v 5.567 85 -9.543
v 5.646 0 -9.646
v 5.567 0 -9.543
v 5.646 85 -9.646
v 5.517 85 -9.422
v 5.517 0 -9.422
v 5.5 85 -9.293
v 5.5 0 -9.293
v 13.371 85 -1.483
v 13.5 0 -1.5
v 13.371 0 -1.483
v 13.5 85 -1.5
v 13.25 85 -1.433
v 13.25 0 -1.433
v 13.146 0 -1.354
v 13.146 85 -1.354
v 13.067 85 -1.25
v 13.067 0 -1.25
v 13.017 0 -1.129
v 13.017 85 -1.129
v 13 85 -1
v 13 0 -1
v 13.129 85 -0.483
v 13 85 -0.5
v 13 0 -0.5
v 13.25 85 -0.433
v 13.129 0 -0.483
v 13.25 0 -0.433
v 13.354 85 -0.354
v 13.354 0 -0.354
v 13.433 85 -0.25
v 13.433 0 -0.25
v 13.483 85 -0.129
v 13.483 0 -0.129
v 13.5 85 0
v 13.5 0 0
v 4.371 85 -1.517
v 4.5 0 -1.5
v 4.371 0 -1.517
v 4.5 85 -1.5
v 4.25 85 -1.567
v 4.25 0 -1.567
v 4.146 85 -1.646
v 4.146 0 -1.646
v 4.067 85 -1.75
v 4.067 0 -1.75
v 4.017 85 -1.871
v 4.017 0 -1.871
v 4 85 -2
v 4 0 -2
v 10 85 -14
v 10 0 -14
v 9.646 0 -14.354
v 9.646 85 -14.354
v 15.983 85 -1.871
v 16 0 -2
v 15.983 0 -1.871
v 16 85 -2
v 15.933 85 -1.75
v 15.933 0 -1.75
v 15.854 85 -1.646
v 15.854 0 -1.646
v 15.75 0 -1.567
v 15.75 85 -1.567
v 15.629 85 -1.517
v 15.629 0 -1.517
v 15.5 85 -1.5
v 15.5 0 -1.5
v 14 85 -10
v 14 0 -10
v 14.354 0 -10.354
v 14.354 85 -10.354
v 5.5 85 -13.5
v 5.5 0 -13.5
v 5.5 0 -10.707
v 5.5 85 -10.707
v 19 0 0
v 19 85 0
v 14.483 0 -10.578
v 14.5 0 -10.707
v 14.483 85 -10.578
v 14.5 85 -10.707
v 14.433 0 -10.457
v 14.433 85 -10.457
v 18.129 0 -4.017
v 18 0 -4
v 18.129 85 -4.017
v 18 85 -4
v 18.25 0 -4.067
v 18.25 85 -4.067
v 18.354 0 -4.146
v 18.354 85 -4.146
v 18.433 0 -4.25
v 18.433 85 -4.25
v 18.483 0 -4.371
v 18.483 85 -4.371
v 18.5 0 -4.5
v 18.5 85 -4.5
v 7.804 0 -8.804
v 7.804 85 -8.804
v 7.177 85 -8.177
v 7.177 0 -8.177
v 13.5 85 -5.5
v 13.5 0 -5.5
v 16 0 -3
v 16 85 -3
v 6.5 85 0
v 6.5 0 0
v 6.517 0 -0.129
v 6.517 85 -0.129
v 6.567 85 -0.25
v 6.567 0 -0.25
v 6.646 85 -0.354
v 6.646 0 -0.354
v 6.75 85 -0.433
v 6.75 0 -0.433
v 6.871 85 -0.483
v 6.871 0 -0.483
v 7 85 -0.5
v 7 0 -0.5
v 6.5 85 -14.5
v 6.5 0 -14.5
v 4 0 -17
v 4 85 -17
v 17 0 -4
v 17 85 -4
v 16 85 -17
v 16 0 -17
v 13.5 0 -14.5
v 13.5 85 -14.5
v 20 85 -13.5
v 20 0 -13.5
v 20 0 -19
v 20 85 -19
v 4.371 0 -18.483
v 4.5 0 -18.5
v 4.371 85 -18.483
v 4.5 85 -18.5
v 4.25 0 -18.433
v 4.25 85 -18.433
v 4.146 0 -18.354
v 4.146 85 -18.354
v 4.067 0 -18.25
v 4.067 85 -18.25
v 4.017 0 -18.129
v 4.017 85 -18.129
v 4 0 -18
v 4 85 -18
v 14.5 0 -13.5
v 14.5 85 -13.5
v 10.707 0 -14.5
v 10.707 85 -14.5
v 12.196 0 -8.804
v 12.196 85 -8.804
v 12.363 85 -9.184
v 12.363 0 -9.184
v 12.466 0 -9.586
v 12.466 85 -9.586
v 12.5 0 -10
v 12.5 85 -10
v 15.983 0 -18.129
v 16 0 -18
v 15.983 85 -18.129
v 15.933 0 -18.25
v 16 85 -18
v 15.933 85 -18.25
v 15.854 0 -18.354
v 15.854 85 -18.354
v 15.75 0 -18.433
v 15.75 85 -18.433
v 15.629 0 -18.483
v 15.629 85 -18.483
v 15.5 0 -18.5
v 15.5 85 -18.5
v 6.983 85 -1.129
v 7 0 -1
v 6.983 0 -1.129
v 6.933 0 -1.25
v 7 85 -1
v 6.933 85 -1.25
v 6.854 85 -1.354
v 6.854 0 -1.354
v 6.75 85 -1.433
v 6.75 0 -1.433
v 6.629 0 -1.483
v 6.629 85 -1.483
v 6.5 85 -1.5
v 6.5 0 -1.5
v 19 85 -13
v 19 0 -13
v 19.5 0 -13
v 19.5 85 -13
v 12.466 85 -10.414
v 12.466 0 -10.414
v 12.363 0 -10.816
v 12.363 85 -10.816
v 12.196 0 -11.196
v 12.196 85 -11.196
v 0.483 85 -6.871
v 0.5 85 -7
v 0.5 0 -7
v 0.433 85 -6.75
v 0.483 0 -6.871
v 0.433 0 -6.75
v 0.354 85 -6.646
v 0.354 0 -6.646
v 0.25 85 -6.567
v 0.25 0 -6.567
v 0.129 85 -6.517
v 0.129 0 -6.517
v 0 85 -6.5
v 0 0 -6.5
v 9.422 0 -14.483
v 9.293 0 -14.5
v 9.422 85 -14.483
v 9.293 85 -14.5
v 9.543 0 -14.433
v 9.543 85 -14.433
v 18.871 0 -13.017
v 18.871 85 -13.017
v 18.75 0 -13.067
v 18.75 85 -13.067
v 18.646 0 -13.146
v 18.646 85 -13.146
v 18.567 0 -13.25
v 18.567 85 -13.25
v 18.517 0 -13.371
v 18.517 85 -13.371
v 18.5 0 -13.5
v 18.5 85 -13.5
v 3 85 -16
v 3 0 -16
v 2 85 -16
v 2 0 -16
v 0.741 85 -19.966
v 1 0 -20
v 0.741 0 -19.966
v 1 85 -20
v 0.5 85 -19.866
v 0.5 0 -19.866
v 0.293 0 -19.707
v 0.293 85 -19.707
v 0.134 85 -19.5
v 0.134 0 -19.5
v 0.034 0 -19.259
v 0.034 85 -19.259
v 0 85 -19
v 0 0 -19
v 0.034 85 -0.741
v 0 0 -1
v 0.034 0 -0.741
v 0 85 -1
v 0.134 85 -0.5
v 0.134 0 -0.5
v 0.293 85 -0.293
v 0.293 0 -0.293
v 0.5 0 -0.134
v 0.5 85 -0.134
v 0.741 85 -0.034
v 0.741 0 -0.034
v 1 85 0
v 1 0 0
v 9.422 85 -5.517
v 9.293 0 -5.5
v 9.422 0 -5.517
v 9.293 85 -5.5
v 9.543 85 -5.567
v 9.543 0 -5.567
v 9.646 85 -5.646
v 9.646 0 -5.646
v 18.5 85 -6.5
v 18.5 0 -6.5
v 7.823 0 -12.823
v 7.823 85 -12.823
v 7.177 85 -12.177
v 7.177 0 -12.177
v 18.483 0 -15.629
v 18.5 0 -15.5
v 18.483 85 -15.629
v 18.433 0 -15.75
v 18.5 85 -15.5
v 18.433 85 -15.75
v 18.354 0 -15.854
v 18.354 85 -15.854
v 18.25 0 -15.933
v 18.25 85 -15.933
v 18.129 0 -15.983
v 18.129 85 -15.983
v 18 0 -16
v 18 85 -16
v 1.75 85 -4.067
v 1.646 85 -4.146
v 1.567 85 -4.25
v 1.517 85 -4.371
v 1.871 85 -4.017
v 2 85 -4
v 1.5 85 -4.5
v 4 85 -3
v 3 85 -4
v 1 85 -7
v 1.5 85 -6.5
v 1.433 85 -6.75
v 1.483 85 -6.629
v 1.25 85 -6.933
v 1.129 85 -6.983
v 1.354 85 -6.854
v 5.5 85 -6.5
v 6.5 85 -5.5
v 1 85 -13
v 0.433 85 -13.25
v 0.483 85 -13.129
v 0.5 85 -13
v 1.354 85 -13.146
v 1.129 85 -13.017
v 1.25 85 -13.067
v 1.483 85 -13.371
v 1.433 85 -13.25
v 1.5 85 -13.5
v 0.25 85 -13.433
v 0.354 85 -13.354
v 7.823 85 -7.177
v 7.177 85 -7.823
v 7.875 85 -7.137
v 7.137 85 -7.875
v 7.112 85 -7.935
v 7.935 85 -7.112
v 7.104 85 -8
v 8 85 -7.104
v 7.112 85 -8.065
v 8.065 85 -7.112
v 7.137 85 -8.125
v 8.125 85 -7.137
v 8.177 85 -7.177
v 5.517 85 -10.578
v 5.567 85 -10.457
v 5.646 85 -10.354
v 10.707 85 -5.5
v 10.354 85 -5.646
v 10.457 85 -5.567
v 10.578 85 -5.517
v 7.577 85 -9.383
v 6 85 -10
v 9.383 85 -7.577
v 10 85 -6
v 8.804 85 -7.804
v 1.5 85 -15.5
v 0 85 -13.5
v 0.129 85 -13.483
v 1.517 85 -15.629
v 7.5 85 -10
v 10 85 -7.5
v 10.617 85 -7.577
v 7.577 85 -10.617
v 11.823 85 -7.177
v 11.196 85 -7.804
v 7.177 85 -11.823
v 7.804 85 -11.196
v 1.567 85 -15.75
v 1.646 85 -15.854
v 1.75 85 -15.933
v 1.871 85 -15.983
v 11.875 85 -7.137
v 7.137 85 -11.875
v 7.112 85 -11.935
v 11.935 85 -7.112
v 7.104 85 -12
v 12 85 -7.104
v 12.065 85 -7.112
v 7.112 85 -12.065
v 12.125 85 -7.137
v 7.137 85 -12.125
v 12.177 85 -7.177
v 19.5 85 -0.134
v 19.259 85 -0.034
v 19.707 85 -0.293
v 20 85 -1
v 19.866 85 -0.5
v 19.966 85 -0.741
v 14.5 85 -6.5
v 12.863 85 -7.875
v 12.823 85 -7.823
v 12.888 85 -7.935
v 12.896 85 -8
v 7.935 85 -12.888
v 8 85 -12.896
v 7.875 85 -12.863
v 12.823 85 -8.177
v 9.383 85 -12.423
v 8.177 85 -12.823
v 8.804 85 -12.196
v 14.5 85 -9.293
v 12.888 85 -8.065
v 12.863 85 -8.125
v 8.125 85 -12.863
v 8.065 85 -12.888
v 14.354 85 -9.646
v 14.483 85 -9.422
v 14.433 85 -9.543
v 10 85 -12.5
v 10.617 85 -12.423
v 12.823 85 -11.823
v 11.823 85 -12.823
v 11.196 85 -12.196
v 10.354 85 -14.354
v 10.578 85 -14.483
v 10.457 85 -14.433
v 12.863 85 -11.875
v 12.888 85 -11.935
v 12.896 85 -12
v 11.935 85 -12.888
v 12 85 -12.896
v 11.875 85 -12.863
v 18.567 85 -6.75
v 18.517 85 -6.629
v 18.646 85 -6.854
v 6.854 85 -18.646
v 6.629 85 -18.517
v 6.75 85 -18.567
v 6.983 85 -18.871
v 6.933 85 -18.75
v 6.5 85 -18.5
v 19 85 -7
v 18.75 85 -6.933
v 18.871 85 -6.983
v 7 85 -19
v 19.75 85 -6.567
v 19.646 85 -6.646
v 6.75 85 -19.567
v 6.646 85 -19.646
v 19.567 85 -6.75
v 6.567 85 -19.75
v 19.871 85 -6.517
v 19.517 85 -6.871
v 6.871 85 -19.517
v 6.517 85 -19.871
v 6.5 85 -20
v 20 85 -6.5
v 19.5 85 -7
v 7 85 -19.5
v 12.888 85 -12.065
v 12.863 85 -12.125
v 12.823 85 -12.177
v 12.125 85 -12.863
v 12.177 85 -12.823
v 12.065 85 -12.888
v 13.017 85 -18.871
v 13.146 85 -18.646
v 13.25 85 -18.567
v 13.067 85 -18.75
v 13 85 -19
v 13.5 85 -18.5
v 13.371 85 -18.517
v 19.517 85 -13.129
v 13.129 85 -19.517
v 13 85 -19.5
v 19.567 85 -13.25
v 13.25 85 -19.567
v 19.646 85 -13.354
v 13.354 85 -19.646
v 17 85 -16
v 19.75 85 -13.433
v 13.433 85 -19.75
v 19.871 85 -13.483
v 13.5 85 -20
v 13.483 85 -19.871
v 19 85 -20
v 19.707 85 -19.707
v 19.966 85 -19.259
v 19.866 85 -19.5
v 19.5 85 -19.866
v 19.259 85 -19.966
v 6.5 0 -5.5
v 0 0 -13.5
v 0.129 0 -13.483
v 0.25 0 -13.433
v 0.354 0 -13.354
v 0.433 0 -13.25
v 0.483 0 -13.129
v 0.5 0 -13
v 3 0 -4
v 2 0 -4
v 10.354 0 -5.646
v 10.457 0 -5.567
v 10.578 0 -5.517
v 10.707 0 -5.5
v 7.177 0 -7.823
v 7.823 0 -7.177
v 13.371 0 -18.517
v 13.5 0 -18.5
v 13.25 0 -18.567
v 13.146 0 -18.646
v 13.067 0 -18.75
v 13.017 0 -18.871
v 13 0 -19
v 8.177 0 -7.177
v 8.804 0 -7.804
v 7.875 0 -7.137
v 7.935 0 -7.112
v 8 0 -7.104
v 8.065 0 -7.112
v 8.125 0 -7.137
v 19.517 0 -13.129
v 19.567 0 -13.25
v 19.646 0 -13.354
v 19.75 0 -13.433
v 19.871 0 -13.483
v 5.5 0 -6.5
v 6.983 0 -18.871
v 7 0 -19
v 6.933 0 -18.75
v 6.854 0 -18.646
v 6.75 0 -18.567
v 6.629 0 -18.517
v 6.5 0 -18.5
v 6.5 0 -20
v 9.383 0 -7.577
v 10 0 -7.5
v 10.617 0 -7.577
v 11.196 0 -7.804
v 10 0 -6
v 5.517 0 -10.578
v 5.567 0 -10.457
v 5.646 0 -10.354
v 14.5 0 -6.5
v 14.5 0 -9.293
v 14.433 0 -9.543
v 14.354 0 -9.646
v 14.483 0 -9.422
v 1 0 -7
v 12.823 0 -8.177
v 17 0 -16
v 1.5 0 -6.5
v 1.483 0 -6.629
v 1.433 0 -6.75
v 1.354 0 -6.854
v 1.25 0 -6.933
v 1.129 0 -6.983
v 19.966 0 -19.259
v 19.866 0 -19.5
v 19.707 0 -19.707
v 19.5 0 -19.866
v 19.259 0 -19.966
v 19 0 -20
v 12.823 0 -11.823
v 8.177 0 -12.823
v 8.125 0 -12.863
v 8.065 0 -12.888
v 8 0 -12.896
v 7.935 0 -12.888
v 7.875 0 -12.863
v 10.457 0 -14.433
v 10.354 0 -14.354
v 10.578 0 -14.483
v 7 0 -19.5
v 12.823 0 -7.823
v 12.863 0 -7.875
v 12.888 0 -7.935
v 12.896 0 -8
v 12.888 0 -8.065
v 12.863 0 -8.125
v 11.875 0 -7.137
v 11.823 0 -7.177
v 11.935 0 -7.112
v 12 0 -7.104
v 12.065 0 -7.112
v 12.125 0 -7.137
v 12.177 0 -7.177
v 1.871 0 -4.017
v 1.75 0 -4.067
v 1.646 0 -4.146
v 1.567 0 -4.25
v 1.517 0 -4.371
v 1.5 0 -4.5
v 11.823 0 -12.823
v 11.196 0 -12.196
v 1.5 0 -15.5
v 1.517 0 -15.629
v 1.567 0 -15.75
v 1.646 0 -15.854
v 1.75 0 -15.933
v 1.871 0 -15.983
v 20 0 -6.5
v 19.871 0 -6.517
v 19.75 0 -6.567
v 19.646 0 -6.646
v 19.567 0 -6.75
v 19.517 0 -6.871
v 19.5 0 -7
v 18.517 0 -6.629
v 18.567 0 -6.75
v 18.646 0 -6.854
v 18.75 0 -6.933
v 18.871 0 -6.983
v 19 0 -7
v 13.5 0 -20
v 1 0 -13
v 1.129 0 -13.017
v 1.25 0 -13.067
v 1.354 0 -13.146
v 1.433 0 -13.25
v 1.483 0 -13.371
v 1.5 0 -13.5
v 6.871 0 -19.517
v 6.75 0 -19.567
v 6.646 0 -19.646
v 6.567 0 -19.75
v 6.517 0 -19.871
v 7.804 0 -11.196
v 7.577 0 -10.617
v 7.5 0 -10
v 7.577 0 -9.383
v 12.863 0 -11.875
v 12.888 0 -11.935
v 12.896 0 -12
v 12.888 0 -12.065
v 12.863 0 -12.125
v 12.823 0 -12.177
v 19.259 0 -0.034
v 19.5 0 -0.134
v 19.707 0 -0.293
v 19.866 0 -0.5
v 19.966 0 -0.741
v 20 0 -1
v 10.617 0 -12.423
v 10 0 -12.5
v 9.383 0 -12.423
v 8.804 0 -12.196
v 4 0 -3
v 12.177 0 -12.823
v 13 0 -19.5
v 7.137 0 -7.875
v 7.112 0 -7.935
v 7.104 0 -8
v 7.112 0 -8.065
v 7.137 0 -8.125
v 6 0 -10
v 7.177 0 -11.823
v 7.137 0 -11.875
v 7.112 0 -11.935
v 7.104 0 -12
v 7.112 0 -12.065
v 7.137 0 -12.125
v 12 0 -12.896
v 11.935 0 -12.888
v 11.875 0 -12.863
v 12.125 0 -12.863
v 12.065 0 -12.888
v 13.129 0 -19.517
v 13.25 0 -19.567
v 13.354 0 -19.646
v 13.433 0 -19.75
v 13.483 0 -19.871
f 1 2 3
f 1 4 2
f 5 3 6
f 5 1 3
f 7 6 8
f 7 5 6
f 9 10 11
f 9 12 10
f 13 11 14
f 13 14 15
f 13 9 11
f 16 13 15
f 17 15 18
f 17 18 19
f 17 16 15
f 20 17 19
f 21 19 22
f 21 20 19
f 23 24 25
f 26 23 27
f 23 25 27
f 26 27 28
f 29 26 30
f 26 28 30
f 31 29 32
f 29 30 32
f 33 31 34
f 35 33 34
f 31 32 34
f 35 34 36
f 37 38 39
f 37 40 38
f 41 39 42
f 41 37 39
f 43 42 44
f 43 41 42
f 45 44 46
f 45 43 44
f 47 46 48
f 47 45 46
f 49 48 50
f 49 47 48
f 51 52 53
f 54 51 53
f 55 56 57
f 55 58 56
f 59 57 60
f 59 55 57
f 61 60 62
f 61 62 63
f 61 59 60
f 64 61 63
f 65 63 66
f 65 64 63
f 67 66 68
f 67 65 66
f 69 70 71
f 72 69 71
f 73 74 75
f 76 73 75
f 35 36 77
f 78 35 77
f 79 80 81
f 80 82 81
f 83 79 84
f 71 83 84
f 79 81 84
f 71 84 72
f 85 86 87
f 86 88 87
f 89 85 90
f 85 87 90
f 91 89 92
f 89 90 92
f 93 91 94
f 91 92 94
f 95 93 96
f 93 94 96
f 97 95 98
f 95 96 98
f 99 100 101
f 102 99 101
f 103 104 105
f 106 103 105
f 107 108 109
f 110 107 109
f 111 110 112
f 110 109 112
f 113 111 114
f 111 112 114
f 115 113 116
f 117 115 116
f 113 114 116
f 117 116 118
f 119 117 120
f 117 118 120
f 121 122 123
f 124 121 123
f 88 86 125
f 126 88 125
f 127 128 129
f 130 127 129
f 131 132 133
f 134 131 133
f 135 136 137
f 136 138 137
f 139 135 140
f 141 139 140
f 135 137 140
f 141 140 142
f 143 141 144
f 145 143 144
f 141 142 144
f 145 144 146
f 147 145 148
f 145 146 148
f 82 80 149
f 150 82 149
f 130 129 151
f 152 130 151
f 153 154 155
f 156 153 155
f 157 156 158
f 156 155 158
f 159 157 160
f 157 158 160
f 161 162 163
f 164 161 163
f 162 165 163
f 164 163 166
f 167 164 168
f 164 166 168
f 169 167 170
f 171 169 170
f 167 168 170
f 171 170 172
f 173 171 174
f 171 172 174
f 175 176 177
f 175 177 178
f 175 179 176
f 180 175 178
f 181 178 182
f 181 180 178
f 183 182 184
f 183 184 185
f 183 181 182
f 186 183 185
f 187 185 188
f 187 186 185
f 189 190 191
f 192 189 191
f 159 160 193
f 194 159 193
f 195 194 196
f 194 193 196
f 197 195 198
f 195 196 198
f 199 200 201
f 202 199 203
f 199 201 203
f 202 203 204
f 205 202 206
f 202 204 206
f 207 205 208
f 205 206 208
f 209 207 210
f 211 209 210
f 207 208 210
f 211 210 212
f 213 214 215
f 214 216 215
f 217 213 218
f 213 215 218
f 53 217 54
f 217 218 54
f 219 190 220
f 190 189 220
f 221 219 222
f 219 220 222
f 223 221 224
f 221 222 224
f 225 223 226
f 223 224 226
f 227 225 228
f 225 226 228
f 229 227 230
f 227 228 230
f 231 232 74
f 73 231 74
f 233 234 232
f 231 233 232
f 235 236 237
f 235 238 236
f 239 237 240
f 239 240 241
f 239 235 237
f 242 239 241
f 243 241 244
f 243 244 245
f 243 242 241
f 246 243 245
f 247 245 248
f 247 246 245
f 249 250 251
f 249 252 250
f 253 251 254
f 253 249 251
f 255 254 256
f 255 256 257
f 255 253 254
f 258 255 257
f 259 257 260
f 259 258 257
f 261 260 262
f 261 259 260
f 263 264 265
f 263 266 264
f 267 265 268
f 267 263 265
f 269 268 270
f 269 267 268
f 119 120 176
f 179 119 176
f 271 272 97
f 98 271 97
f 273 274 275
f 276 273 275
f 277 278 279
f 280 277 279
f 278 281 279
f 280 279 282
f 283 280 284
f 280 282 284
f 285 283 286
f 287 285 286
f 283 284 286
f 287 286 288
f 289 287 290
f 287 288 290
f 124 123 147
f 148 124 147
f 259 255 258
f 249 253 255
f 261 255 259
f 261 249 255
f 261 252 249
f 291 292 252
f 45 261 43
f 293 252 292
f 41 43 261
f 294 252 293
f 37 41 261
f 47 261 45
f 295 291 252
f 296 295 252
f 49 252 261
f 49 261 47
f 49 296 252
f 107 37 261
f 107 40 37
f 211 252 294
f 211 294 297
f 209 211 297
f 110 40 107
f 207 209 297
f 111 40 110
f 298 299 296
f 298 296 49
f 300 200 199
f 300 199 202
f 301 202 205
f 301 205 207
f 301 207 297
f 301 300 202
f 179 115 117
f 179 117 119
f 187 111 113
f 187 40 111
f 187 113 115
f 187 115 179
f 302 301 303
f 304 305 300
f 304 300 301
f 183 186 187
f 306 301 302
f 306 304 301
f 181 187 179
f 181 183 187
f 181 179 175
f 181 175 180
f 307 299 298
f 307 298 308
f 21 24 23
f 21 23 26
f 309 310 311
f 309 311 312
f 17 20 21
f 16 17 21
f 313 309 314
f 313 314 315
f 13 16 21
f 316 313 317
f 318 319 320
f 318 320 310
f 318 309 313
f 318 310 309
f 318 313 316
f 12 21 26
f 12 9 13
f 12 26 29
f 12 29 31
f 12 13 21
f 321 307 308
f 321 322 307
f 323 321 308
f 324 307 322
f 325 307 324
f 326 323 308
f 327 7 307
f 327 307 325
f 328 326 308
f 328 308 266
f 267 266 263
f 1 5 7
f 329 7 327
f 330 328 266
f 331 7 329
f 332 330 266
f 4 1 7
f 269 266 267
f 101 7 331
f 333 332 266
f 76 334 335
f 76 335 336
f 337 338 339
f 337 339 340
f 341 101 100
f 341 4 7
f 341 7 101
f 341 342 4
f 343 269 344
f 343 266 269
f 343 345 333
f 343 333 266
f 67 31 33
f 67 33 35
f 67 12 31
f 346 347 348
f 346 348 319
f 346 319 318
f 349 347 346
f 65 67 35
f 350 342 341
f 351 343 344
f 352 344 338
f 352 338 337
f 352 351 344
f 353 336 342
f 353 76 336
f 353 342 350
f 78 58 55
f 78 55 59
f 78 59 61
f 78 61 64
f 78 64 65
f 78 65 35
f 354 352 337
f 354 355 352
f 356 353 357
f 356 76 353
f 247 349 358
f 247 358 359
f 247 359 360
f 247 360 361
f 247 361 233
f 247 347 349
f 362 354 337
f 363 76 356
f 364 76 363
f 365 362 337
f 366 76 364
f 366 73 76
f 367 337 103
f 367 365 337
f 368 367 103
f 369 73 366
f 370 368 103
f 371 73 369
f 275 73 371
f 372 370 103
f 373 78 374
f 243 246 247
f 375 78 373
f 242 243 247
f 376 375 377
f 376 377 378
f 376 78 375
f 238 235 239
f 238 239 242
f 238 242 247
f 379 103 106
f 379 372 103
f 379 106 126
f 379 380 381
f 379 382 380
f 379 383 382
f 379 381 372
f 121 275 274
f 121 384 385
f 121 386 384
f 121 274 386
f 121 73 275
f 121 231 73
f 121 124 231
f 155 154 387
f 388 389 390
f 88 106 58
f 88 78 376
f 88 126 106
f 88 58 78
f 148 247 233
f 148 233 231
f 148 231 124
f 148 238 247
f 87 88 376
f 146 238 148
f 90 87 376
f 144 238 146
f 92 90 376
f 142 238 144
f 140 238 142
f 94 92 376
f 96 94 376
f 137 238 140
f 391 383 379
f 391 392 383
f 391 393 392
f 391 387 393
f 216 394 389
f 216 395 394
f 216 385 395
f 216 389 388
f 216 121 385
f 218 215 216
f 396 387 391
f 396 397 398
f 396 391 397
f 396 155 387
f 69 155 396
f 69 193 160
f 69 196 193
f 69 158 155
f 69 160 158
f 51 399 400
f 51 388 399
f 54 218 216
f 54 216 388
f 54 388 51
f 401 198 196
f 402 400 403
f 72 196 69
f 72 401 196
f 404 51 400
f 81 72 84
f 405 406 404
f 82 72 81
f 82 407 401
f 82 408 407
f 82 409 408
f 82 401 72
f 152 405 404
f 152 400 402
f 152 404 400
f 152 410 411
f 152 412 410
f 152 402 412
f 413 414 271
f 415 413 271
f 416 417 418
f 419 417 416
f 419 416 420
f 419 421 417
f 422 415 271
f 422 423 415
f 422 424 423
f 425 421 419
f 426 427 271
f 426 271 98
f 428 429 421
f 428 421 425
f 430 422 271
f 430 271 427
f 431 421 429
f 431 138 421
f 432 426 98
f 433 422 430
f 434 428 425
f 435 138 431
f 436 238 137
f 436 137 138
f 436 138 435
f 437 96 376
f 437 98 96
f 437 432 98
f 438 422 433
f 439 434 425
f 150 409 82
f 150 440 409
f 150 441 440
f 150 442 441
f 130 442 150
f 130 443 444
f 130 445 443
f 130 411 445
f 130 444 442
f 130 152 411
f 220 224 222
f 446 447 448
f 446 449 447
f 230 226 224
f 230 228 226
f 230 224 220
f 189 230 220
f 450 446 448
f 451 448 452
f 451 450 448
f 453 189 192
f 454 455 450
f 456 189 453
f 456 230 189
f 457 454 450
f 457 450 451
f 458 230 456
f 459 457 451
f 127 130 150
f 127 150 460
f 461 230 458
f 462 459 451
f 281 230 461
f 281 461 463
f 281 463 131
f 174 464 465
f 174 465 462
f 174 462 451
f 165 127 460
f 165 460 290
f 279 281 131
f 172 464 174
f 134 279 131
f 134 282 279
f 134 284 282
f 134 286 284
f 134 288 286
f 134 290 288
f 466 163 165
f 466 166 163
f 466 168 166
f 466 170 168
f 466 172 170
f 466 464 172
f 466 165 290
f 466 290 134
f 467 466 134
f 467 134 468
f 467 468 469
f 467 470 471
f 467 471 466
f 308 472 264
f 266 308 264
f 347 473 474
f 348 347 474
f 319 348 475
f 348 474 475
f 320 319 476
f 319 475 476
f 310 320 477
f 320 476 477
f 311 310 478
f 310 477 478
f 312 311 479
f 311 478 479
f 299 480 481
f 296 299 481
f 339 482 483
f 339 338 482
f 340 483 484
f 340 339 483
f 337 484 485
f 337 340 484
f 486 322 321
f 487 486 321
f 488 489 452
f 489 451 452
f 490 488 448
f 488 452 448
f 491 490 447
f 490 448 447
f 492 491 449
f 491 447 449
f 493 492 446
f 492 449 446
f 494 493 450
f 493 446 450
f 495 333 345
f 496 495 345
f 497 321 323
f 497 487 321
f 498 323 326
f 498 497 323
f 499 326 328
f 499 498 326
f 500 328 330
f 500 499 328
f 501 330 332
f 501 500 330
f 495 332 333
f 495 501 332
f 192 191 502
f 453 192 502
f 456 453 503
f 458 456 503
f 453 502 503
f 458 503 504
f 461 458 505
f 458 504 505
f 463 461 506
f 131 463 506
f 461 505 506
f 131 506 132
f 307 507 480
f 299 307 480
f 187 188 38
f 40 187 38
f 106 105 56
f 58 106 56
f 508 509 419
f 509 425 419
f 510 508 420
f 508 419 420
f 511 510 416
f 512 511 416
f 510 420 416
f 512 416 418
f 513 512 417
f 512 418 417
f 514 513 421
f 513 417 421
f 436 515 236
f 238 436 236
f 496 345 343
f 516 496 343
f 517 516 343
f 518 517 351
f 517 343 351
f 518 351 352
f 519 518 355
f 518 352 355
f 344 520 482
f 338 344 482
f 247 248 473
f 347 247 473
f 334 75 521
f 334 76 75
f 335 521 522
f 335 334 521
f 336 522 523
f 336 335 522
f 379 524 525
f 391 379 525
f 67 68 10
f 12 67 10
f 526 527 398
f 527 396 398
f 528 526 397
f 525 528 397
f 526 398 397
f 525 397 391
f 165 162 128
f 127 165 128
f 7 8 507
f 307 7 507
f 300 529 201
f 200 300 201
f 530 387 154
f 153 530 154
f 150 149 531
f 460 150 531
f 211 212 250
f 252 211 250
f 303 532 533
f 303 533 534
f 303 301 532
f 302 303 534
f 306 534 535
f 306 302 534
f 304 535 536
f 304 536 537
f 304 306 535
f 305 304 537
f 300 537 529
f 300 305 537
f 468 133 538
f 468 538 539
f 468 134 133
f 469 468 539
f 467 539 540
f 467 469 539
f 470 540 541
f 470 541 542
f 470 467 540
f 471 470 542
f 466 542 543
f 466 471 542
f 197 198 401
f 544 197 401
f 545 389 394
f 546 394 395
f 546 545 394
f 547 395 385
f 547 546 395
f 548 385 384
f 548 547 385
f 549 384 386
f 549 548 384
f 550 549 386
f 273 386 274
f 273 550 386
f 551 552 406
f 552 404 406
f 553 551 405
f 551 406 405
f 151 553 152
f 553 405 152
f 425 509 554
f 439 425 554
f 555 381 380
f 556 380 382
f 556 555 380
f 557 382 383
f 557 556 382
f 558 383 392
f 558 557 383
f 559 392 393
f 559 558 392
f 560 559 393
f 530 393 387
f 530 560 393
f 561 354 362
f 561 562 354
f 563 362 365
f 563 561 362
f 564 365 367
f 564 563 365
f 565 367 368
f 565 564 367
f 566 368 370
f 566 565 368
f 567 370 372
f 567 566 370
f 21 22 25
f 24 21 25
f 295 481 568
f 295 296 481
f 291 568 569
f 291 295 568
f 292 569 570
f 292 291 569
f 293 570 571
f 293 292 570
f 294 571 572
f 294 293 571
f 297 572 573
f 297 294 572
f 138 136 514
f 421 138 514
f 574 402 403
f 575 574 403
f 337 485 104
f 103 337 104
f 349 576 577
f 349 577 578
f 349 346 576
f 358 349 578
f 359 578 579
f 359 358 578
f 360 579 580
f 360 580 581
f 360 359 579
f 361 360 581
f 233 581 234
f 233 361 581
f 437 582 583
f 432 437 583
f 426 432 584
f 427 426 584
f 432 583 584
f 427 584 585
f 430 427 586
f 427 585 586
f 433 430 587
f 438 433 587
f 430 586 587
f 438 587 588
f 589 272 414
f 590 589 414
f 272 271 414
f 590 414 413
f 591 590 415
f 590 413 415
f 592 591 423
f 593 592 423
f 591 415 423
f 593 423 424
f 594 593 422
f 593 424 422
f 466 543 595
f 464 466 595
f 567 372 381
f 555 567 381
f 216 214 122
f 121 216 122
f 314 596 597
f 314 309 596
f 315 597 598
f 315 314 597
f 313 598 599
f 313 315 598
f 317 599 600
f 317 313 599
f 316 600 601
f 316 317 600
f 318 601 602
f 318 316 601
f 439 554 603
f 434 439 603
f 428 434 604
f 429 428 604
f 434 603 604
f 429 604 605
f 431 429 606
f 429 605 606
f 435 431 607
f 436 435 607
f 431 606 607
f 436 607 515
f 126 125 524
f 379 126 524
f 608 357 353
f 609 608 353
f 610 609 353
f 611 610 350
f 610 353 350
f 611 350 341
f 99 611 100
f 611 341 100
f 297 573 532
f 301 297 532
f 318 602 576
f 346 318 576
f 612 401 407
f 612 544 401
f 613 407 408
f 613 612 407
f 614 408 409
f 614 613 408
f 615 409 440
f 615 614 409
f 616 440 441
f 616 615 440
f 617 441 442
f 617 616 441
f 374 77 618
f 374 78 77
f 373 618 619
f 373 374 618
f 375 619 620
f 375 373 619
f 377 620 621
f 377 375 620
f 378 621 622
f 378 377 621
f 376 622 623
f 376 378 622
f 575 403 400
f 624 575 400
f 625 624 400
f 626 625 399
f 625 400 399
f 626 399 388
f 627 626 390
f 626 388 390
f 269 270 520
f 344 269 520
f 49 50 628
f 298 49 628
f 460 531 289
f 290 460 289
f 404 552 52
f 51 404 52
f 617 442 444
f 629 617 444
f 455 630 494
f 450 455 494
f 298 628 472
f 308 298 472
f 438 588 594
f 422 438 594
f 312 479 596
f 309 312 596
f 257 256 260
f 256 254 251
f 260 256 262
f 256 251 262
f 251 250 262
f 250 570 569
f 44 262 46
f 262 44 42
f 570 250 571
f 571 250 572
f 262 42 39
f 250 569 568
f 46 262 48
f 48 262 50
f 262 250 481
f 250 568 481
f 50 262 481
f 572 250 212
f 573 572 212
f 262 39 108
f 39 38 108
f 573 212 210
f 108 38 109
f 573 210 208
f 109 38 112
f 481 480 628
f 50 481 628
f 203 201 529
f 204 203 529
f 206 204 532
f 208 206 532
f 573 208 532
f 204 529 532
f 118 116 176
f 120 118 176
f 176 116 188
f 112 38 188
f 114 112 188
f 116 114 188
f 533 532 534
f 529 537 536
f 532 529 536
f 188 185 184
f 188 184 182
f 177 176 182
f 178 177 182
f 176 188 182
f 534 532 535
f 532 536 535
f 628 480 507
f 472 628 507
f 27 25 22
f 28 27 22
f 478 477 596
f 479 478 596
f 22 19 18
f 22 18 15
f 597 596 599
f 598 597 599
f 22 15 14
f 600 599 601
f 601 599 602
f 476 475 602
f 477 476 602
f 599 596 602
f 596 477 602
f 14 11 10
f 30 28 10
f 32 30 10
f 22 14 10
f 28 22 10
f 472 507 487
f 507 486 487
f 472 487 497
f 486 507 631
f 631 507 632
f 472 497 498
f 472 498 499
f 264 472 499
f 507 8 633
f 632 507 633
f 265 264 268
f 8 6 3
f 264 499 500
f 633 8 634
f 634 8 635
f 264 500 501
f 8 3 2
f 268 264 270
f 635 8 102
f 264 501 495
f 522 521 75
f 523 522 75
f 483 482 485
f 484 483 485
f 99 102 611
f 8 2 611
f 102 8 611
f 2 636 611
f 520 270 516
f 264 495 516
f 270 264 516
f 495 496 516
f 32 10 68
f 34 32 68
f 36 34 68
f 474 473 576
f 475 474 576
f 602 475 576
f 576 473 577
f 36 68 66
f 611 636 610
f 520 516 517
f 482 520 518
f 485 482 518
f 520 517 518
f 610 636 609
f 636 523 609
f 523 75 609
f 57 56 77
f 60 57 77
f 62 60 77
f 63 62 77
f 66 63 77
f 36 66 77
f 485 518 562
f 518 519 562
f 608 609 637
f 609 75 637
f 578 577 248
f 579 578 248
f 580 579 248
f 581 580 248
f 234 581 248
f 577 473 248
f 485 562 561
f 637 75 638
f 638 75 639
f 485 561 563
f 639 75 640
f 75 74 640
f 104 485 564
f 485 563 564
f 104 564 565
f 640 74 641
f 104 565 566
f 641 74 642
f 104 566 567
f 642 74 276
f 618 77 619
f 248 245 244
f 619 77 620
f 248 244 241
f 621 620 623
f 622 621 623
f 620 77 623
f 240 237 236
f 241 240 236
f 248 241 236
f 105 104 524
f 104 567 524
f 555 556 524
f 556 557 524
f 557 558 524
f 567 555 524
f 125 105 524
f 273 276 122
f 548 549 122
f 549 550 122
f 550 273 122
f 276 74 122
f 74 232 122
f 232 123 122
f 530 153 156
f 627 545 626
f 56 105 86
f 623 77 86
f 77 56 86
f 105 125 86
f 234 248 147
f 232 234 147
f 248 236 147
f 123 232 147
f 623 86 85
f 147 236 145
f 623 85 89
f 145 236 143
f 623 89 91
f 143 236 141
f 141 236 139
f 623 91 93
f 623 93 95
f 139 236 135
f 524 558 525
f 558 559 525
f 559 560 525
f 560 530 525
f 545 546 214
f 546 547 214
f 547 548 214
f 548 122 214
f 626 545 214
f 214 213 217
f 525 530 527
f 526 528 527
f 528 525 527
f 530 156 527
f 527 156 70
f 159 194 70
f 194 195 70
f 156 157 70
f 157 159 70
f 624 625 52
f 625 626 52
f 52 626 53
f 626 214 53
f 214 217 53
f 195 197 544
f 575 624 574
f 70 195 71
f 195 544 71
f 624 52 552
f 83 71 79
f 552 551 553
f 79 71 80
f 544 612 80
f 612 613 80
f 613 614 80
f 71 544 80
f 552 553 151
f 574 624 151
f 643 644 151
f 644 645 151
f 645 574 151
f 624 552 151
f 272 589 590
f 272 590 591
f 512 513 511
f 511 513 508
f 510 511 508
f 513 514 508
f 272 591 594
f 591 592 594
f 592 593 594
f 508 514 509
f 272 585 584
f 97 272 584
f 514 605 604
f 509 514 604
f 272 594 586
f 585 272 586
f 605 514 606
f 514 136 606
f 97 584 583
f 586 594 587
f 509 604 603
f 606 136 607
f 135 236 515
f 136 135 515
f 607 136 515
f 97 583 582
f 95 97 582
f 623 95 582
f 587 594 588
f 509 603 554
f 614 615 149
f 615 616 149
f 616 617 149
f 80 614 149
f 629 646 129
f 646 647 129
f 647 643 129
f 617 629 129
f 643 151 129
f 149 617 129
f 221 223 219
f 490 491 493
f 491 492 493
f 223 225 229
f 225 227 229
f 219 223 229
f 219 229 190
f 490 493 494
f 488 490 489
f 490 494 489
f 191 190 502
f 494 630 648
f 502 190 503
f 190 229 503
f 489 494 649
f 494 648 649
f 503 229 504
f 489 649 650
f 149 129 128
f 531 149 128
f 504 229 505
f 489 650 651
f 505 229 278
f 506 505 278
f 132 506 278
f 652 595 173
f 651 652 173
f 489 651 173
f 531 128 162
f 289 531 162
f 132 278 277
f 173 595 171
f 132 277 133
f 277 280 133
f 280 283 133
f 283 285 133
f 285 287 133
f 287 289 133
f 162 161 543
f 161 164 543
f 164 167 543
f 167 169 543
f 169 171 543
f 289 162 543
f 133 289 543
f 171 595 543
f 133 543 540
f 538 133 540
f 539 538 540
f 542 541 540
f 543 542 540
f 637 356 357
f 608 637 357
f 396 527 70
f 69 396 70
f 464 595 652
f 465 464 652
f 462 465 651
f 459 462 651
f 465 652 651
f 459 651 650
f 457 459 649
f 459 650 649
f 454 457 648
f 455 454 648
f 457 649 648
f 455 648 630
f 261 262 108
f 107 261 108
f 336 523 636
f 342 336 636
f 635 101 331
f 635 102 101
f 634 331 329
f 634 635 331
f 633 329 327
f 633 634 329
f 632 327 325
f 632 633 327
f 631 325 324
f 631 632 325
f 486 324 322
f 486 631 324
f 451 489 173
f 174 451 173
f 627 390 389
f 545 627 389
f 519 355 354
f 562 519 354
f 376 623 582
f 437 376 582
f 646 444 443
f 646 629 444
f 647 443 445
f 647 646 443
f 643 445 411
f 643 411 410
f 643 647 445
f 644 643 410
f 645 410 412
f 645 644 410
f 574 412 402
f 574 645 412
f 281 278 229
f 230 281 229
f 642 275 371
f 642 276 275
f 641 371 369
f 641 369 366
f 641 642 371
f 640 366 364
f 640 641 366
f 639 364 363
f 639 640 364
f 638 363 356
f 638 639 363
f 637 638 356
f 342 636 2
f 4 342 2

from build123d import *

# Parameters (mm, degrees)
BOSS_EXTRUDE1_DEPTH = 85
FILLET1_R           = 1
CUT_EXTRUDE1_DEPTH  = 86
FILLET2_R           = 0.5
FILLET3_R           = 0.25


with BuildPart() as part:
    # Sketch3 → Boss-Extrude1 (new body)
    with BuildSketch(Plane(origin=(0, 0, 0), x_dir=(1, 0, 0), z_dir=(0, 1, 0))):
        with BuildLine():
            Line((7, 18.5), (7, 19.5))
            ThreePointArc((7, 19.5), (6.646446609, 19.646446609), (6.5, 20))
            Line((6.5, 20), (0, 20))
            Line((0, 20), (0, 13.5))
            ThreePointArc((0, 13.5), (0.353553391, 13.353553391), (0.5, 13))
            Line((0.5, 13), (1.5, 13))
            Line((1.5, 13), (1.5, 16))
            Line((1.5, 16), (3, 16))
            Line((3, 16), (5.5, 13.5))
            Line((5.5, 13.5), (5.5, 10.5))
            Line((5.5, 10.5), (6, 10))
            Line((6, 10), (5.5, 9.5))
            Line((5.5, 9.5), (5.5, 6.5))
            Line((5.5, 6.5), (3, 4))
            Line((3, 4), (1.5, 4))
            Line((1.5, 4), (1.5, 7))
            Line((1.5, 7), (0.5, 7))
            ThreePointArc((0.5, 7), (0.353553391, 6.646446609), (0, 6.5))
            Line((0, 6.5), (0, 0))
            Line((0, 0), (6.5, 0))
            ThreePointArc((6.5, 0), (6.646446609, 0.353553391), (7, 0.5))
            Line((7, 0.5), (7, 1.5))
            Line((7, 1.5), (4, 1.5))
            Line((4, 1.5), (4, 3))
            Line((4, 3), (6.5, 5.5))
            Line((6.5, 5.5), (9.5, 5.5))
            Line((9.5, 5.5), (10, 6))
            Line((10, 6), (10.5, 5.5))
            Line((10.5, 5.5), (13.5, 5.5))
            Line((13.5, 5.5), (16, 3))
            Line((16, 3), (16, 1.5))
            Line((16, 1.5), (13, 1.5))
            Line((13, 1.5), (13, 0.5))
            ThreePointArc((13, 0.5), (13.353553391, 0.353553391), (13.5, 0))
            Line((13.5, 0), (20, 0))
            Line((20, 0), (20, 6.5))
            ThreePointArc((20, 6.5), (19.646446609, 6.646446609), (19.5, 7))
            Line((19.5, 7), (18.5, 7))
            Line((18.5, 7), (18.5, 4))
            Line((18.5, 4), (17, 4))
            Line((17, 4), (14.5, 6.5))
            Line((14.5, 6.5), (14.5, 9.5))
            Line((14.5, 9.5), (14, 10))
            Line((14, 10), (14.5, 10.5))
            Line((14.5, 10.5), (14.5, 13.5))
            Line((14.5, 13.5), (17, 16))
            Line((17, 16), (18.5, 16))
            Line((18.5, 16), (18.5, 13))
            Line((18.5, 13), (19.5, 13))
            ThreePointArc((19.5, 13), (19.646446609, 13.353553391), (20, 13.5))
            Line((20, 13.5), (20, 20))
            Line((20, 20), (13.5, 20))
            ThreePointArc((13.5, 20), (13.353553391, 19.646446609), (13, 19.5))
            Line((13, 19.5), (13, 18.5))
            Line((13, 18.5), (16, 18.5))
            Line((16, 18.5), (16, 17))
            Line((16, 17), (13.5, 14.5))
            Line((13.5, 14.5), (10.5, 14.5))
            Line((10.5, 14.5), (10, 14))
            Line((10, 14), (9.5, 14.5))
            Line((9.5, 14.5), (6.5, 14.5))
            Line((6.5, 14.5), (4, 17))
            Line((4, 17), (4, 18.5))
            Line((4, 18.5), (7, 18.5))
        make_face()
    extrude(amount=BOSS_EXTRUDE1_DEPTH)

    # Fillet1
    fillet1_edges = [part.edges().sort_by_distance(p)[0] for p in [
        (20, 42.5, 0),
        (0, 42.5, 0),
        (0, 42.5, -20),
        (20, 42.5, -20),
    ]]
    fillet(fillet1_edges, radius=FILLET1_R)

    # Sketch4 → Cut-Extrude1 (cut, through all)
    with BuildSketch(Plane(origin=(0, 85, 0), x_dir=(1, 0, 0), z_dir=(0, 1, 0))):
        with BuildLine():
            Line((10, 11), (11.195582496, 12.195582496))
            ThreePointArc((11.195582496, 12.195582496), (10, 12.5), (8.804417504, 12.195582496))
            Line((8.804417504, 12.195582496), (10, 11))
        make_face()
        with BuildLine():
            ThreePointArc((12.195582496, 11.195582496), (11.767766953, 11.767766953), (11.195582496, 12.195582496))
            Line((11.195582496, 12.195582496), (10, 11))
            Line((10, 11), (11, 10))
            Line((11, 10), (12.195582496, 11.195582496))
        make_face()
        with BuildLine():
            Line((9, 10), (10, 11))
            Line((10, 11), (8.804417504, 12.195582496))
            ThreePointArc((8.804417504, 12.195582496), (8.232233047, 11.767766953), (7.804417504, 11.195582496))
            Line((7.804417504, 11.195582496), (9, 10))
        make_face()
        Polygon((11, 10), (10, 11), (9, 10), (10, 9), align=None)
        with BuildLine():
            Line((7.804417504, 8.804417504), (9, 10))
            Line((9, 10), (7.804417504, 11.195582496))
            ThreePointArc((7.804417504, 11.195582496), (7.5, 10), (7.804417504, 8.804417504))
        make_face()
        with BuildLine():
            Line((10, 9), (9, 10))
            Line((9, 10), (7.804417504, 8.804417504))
            ThreePointArc((7.804417504, 8.804417504), (8.232233047, 8.232233047), (8.804417504, 7.804417504))
            Line((8.804417504, 7.804417504), (10, 9))
        make_face()
        with BuildLine():
            Line((11.195582496, 7.804417504), (10, 9))
            Line((10, 9), (8.804417504, 7.804417504))
            ThreePointArc((8.804417504, 7.804417504), (10, 7.5), (11.195582496, 7.804417504))
        make_face()
        with BuildLine():
            Line((12.195582496, 8.804417504), (11, 10))
            Line((11, 10), (10, 9))
            Line((10, 9), (11.195582496, 7.804417504))
            ThreePointArc((11.195582496, 7.804417504), (11.767766953, 8.232233047), (12.195582496, 8.804417504))
        make_face()
        with BuildLine():
            ThreePointArc((12.5, 10), (12.422700584, 10.616864556), (12.195582496, 11.195582496))
            Line((12.195582496, 11.195582496), (11, 10))
            Line((11, 10), (12.195582496, 8.804417504))
            ThreePointArc((12.195582496, 8.804417504), (12.422700584, 9.383135444), (12.5, 10))
        make_face()
        with BuildLine():
            ThreePointArc((8.804417504, 7.804417504), (8.232233047, 8.232233047), (7.804417504, 8.804417504))
            Line((7.804417504, 8.804417504), (7, 8))
            Line((7, 8), (8, 7))
            Line((8, 7), (8.804417504, 7.804417504))
        make_face()
        with BuildLine():
            Line((13, 8), (12.195582496, 8.804417504))
            ThreePointArc((12.195582496, 8.804417504), (11.767766953, 8.232233047), (11.195582496, 7.804417504))
            Line((11.195582496, 7.804417504), (12, 7))
            Line((12, 7), (13, 8))
        make_face()
        with BuildLine():
            Line((13, 12), (12, 13))
            Line((12, 13), (11.195582496, 12.195582496))
            ThreePointArc((11.195582496, 12.195582496), (11.767766953, 11.767766953), (12.195582496, 11.195582496))
            Line((12.195582496, 11.195582496), (13, 12))
        make_face()
        with BuildLine():
            ThreePointArc((7.804417504, 11.195582496), (8.232233047, 11.767766953), (8.804417504, 12.195582496))
            Line((8.804417504, 12.195582496), (8, 13))
            Line((8, 13), (7, 12))
            Line((7, 12), (7.804417504, 11.195582496))
        make_face()
    extrude(amount=-CUT_EXTRUDE1_DEPTH, mode=Mode.SUBTRACT)

    # Fillet2
    fillet2_edges = [part.edges().sort_by_distance(p)[0] for p in [
        (18.5, 42.5, -13),
        (18.5, 42.5, -16),
        (14.5, 42.5, -10.5),
        (14.5, 42.5, -9.5),
        (18.5, 42.5, -4),
        (18.5, 42.5, -7),
        (13, 42.5, -1.5),
        (16, 42.5, -1.5),
        (10.5, 42.5, -5.5),
        (9.5, 42.5, -5.5),
        (4, 42.5, -1.5),
        (7, 42.5, -1.5),
        (1.5, 42.5, -7),
        (1.5, 42.5, -4),
        (5.5, 42.5, -9.5),
        (5.5, 42.5, -10.5),
        (1.5, 42.5, -16),
        (1.5, 42.5, -13),
        (7, 42.5, -18.5),
        (4, 42.5, -18.5),
        (9.5, 42.5, -14.5),
        (10.5, 42.5, -14.5),
        (16, 42.5, -18.5),
        (13, 42.5, -18.5),
    ]]
    fillet(fillet2_edges, radius=FILLET2_R)

    # Fillet3
    fillet3_edges = [part.edges().sort_by_distance(p)[0] for p in [
        (7, 42.5, -12),
        (8, 42.5, -13),
        (12, 42.5, -13),
        (13, 42.5, -12),
        (13, 42.5, -8),
        (12, 42.5, -7),
        (8, 42.5, -7),
        (7, 42.5, -8),
    ]]
    fillet(fillet3_edges, radius=FILLET3_R)


solid = part.part
